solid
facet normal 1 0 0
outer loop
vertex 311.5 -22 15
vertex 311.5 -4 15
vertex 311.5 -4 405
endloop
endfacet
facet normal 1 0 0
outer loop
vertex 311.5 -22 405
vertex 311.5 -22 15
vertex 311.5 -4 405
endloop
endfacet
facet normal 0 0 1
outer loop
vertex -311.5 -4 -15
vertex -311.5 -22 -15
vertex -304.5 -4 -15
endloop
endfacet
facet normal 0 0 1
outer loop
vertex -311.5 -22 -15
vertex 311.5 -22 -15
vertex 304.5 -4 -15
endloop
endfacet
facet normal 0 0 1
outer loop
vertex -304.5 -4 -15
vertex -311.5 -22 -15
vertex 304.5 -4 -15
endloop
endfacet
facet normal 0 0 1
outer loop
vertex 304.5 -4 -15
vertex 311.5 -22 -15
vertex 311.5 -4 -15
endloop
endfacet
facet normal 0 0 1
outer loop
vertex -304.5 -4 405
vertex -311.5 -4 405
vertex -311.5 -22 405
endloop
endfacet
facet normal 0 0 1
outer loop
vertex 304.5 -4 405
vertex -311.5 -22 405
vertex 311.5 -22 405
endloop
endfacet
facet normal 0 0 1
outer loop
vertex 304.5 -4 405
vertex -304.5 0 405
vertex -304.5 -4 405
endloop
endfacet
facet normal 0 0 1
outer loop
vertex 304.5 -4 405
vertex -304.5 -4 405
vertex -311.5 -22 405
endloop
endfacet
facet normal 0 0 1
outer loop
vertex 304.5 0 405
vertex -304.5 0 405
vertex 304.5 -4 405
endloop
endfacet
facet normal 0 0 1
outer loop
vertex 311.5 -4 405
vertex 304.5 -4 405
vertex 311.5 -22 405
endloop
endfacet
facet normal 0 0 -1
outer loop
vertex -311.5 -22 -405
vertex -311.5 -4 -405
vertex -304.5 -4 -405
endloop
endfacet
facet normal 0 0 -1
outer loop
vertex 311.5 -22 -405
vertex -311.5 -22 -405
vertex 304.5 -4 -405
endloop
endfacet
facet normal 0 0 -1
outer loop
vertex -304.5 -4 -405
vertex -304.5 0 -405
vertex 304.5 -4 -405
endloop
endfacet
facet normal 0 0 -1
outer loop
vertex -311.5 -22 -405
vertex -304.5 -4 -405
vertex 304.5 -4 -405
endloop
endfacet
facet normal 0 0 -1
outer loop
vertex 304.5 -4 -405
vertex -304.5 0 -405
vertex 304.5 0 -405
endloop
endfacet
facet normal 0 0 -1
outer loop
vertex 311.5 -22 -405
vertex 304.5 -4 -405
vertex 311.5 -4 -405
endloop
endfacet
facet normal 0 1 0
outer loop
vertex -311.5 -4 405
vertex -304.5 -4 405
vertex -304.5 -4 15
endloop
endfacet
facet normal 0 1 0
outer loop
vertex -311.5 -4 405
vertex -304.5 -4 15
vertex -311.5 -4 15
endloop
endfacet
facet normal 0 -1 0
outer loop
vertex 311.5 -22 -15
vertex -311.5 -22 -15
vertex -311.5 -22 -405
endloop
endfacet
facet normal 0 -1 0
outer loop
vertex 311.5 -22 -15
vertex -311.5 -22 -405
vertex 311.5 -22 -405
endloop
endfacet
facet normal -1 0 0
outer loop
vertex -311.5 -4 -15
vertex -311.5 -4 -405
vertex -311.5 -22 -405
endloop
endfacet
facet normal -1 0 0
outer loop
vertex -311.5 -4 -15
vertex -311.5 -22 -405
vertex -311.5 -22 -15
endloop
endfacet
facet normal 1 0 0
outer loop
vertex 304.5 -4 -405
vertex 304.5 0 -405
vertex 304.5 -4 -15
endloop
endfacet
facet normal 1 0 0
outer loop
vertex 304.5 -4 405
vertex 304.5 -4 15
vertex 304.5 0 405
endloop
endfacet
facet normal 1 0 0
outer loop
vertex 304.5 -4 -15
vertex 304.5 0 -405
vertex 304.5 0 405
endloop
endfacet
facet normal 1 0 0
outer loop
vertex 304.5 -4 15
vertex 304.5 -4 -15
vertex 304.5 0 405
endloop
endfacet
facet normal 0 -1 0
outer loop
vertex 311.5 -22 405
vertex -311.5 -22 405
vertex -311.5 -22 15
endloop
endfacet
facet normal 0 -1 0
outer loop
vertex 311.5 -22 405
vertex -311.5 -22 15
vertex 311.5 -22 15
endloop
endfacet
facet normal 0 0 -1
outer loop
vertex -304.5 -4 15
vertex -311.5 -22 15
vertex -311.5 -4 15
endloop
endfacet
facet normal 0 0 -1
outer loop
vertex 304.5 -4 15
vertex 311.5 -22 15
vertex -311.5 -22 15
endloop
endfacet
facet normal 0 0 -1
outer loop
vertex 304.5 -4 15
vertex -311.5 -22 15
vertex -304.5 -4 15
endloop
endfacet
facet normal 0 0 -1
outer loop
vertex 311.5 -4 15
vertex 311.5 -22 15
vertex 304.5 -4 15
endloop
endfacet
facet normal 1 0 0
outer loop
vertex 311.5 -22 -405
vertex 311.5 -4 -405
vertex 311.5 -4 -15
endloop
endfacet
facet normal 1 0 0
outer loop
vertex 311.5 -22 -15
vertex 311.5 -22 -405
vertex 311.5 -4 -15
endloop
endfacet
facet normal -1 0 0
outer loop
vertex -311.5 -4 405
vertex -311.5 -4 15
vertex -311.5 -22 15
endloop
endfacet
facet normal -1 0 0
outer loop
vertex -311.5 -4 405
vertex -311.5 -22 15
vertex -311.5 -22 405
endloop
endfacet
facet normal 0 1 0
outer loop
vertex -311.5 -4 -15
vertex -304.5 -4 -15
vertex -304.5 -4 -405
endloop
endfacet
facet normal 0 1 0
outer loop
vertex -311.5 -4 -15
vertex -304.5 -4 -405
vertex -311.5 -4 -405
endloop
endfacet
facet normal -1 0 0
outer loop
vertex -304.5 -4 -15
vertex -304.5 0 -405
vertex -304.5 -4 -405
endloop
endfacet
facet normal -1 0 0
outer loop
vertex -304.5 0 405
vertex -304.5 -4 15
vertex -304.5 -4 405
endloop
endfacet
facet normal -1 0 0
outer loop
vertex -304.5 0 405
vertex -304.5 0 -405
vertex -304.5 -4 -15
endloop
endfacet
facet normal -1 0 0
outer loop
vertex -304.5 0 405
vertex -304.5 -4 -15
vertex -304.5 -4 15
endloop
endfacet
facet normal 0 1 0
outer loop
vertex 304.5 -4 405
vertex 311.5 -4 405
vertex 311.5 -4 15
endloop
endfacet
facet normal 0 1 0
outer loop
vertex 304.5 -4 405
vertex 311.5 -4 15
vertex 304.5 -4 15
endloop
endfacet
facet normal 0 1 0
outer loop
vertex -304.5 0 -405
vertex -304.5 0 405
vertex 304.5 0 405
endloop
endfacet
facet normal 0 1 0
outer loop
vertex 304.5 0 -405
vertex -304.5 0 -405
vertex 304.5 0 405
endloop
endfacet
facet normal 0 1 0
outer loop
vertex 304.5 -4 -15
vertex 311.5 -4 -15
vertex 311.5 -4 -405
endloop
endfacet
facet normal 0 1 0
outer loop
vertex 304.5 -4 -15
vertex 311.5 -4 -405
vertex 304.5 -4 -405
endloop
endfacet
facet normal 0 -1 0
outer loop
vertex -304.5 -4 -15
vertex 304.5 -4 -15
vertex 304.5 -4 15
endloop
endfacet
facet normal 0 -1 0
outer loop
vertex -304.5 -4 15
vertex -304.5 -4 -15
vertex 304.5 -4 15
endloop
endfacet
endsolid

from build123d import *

# Parameters (mm, degrees)
F0_W     = 623
F0_H     = 810
F1_DEPTH = 22
F2_W     = 18
F2_H     = 30
F3_DEPTH = 623
F4_W     = 7
F4_H     = 810
F5_DEPTH = 4


with BuildPart() as f1:
    # F0 (on Front) → F1 (new body)
    with BuildSketch(Plane.XZ):
        Rectangle(F0_W, F0_H)
    extrude(amount=F1_DEPTH)

    # F2 (on face) → F3 (cut)
    with BuildSketch(Plane.YZ.offset(311.5)):
        with Locations((-13, 0)):
            Rectangle(F2_W, F2_H)
    extrude(amount=-F3_DEPTH, mode=Mode.SUBTRACT)

    # F4 (on face) → F5 (cut)
    with BuildSketch(Plane(origin=(0, 0, 0), x_dir=(-1, 0, 0), z_dir=(0, 1, 0))):
        with Locations((-308, 0)):
            Rectangle(F4_W, F4_H)
        with Locations((308, 0)):
            Rectangle(F4_W, F4_H)
    extrude(amount=-F5_DEPTH, mode=Mode.SUBTRACT)


solid = f1.part
